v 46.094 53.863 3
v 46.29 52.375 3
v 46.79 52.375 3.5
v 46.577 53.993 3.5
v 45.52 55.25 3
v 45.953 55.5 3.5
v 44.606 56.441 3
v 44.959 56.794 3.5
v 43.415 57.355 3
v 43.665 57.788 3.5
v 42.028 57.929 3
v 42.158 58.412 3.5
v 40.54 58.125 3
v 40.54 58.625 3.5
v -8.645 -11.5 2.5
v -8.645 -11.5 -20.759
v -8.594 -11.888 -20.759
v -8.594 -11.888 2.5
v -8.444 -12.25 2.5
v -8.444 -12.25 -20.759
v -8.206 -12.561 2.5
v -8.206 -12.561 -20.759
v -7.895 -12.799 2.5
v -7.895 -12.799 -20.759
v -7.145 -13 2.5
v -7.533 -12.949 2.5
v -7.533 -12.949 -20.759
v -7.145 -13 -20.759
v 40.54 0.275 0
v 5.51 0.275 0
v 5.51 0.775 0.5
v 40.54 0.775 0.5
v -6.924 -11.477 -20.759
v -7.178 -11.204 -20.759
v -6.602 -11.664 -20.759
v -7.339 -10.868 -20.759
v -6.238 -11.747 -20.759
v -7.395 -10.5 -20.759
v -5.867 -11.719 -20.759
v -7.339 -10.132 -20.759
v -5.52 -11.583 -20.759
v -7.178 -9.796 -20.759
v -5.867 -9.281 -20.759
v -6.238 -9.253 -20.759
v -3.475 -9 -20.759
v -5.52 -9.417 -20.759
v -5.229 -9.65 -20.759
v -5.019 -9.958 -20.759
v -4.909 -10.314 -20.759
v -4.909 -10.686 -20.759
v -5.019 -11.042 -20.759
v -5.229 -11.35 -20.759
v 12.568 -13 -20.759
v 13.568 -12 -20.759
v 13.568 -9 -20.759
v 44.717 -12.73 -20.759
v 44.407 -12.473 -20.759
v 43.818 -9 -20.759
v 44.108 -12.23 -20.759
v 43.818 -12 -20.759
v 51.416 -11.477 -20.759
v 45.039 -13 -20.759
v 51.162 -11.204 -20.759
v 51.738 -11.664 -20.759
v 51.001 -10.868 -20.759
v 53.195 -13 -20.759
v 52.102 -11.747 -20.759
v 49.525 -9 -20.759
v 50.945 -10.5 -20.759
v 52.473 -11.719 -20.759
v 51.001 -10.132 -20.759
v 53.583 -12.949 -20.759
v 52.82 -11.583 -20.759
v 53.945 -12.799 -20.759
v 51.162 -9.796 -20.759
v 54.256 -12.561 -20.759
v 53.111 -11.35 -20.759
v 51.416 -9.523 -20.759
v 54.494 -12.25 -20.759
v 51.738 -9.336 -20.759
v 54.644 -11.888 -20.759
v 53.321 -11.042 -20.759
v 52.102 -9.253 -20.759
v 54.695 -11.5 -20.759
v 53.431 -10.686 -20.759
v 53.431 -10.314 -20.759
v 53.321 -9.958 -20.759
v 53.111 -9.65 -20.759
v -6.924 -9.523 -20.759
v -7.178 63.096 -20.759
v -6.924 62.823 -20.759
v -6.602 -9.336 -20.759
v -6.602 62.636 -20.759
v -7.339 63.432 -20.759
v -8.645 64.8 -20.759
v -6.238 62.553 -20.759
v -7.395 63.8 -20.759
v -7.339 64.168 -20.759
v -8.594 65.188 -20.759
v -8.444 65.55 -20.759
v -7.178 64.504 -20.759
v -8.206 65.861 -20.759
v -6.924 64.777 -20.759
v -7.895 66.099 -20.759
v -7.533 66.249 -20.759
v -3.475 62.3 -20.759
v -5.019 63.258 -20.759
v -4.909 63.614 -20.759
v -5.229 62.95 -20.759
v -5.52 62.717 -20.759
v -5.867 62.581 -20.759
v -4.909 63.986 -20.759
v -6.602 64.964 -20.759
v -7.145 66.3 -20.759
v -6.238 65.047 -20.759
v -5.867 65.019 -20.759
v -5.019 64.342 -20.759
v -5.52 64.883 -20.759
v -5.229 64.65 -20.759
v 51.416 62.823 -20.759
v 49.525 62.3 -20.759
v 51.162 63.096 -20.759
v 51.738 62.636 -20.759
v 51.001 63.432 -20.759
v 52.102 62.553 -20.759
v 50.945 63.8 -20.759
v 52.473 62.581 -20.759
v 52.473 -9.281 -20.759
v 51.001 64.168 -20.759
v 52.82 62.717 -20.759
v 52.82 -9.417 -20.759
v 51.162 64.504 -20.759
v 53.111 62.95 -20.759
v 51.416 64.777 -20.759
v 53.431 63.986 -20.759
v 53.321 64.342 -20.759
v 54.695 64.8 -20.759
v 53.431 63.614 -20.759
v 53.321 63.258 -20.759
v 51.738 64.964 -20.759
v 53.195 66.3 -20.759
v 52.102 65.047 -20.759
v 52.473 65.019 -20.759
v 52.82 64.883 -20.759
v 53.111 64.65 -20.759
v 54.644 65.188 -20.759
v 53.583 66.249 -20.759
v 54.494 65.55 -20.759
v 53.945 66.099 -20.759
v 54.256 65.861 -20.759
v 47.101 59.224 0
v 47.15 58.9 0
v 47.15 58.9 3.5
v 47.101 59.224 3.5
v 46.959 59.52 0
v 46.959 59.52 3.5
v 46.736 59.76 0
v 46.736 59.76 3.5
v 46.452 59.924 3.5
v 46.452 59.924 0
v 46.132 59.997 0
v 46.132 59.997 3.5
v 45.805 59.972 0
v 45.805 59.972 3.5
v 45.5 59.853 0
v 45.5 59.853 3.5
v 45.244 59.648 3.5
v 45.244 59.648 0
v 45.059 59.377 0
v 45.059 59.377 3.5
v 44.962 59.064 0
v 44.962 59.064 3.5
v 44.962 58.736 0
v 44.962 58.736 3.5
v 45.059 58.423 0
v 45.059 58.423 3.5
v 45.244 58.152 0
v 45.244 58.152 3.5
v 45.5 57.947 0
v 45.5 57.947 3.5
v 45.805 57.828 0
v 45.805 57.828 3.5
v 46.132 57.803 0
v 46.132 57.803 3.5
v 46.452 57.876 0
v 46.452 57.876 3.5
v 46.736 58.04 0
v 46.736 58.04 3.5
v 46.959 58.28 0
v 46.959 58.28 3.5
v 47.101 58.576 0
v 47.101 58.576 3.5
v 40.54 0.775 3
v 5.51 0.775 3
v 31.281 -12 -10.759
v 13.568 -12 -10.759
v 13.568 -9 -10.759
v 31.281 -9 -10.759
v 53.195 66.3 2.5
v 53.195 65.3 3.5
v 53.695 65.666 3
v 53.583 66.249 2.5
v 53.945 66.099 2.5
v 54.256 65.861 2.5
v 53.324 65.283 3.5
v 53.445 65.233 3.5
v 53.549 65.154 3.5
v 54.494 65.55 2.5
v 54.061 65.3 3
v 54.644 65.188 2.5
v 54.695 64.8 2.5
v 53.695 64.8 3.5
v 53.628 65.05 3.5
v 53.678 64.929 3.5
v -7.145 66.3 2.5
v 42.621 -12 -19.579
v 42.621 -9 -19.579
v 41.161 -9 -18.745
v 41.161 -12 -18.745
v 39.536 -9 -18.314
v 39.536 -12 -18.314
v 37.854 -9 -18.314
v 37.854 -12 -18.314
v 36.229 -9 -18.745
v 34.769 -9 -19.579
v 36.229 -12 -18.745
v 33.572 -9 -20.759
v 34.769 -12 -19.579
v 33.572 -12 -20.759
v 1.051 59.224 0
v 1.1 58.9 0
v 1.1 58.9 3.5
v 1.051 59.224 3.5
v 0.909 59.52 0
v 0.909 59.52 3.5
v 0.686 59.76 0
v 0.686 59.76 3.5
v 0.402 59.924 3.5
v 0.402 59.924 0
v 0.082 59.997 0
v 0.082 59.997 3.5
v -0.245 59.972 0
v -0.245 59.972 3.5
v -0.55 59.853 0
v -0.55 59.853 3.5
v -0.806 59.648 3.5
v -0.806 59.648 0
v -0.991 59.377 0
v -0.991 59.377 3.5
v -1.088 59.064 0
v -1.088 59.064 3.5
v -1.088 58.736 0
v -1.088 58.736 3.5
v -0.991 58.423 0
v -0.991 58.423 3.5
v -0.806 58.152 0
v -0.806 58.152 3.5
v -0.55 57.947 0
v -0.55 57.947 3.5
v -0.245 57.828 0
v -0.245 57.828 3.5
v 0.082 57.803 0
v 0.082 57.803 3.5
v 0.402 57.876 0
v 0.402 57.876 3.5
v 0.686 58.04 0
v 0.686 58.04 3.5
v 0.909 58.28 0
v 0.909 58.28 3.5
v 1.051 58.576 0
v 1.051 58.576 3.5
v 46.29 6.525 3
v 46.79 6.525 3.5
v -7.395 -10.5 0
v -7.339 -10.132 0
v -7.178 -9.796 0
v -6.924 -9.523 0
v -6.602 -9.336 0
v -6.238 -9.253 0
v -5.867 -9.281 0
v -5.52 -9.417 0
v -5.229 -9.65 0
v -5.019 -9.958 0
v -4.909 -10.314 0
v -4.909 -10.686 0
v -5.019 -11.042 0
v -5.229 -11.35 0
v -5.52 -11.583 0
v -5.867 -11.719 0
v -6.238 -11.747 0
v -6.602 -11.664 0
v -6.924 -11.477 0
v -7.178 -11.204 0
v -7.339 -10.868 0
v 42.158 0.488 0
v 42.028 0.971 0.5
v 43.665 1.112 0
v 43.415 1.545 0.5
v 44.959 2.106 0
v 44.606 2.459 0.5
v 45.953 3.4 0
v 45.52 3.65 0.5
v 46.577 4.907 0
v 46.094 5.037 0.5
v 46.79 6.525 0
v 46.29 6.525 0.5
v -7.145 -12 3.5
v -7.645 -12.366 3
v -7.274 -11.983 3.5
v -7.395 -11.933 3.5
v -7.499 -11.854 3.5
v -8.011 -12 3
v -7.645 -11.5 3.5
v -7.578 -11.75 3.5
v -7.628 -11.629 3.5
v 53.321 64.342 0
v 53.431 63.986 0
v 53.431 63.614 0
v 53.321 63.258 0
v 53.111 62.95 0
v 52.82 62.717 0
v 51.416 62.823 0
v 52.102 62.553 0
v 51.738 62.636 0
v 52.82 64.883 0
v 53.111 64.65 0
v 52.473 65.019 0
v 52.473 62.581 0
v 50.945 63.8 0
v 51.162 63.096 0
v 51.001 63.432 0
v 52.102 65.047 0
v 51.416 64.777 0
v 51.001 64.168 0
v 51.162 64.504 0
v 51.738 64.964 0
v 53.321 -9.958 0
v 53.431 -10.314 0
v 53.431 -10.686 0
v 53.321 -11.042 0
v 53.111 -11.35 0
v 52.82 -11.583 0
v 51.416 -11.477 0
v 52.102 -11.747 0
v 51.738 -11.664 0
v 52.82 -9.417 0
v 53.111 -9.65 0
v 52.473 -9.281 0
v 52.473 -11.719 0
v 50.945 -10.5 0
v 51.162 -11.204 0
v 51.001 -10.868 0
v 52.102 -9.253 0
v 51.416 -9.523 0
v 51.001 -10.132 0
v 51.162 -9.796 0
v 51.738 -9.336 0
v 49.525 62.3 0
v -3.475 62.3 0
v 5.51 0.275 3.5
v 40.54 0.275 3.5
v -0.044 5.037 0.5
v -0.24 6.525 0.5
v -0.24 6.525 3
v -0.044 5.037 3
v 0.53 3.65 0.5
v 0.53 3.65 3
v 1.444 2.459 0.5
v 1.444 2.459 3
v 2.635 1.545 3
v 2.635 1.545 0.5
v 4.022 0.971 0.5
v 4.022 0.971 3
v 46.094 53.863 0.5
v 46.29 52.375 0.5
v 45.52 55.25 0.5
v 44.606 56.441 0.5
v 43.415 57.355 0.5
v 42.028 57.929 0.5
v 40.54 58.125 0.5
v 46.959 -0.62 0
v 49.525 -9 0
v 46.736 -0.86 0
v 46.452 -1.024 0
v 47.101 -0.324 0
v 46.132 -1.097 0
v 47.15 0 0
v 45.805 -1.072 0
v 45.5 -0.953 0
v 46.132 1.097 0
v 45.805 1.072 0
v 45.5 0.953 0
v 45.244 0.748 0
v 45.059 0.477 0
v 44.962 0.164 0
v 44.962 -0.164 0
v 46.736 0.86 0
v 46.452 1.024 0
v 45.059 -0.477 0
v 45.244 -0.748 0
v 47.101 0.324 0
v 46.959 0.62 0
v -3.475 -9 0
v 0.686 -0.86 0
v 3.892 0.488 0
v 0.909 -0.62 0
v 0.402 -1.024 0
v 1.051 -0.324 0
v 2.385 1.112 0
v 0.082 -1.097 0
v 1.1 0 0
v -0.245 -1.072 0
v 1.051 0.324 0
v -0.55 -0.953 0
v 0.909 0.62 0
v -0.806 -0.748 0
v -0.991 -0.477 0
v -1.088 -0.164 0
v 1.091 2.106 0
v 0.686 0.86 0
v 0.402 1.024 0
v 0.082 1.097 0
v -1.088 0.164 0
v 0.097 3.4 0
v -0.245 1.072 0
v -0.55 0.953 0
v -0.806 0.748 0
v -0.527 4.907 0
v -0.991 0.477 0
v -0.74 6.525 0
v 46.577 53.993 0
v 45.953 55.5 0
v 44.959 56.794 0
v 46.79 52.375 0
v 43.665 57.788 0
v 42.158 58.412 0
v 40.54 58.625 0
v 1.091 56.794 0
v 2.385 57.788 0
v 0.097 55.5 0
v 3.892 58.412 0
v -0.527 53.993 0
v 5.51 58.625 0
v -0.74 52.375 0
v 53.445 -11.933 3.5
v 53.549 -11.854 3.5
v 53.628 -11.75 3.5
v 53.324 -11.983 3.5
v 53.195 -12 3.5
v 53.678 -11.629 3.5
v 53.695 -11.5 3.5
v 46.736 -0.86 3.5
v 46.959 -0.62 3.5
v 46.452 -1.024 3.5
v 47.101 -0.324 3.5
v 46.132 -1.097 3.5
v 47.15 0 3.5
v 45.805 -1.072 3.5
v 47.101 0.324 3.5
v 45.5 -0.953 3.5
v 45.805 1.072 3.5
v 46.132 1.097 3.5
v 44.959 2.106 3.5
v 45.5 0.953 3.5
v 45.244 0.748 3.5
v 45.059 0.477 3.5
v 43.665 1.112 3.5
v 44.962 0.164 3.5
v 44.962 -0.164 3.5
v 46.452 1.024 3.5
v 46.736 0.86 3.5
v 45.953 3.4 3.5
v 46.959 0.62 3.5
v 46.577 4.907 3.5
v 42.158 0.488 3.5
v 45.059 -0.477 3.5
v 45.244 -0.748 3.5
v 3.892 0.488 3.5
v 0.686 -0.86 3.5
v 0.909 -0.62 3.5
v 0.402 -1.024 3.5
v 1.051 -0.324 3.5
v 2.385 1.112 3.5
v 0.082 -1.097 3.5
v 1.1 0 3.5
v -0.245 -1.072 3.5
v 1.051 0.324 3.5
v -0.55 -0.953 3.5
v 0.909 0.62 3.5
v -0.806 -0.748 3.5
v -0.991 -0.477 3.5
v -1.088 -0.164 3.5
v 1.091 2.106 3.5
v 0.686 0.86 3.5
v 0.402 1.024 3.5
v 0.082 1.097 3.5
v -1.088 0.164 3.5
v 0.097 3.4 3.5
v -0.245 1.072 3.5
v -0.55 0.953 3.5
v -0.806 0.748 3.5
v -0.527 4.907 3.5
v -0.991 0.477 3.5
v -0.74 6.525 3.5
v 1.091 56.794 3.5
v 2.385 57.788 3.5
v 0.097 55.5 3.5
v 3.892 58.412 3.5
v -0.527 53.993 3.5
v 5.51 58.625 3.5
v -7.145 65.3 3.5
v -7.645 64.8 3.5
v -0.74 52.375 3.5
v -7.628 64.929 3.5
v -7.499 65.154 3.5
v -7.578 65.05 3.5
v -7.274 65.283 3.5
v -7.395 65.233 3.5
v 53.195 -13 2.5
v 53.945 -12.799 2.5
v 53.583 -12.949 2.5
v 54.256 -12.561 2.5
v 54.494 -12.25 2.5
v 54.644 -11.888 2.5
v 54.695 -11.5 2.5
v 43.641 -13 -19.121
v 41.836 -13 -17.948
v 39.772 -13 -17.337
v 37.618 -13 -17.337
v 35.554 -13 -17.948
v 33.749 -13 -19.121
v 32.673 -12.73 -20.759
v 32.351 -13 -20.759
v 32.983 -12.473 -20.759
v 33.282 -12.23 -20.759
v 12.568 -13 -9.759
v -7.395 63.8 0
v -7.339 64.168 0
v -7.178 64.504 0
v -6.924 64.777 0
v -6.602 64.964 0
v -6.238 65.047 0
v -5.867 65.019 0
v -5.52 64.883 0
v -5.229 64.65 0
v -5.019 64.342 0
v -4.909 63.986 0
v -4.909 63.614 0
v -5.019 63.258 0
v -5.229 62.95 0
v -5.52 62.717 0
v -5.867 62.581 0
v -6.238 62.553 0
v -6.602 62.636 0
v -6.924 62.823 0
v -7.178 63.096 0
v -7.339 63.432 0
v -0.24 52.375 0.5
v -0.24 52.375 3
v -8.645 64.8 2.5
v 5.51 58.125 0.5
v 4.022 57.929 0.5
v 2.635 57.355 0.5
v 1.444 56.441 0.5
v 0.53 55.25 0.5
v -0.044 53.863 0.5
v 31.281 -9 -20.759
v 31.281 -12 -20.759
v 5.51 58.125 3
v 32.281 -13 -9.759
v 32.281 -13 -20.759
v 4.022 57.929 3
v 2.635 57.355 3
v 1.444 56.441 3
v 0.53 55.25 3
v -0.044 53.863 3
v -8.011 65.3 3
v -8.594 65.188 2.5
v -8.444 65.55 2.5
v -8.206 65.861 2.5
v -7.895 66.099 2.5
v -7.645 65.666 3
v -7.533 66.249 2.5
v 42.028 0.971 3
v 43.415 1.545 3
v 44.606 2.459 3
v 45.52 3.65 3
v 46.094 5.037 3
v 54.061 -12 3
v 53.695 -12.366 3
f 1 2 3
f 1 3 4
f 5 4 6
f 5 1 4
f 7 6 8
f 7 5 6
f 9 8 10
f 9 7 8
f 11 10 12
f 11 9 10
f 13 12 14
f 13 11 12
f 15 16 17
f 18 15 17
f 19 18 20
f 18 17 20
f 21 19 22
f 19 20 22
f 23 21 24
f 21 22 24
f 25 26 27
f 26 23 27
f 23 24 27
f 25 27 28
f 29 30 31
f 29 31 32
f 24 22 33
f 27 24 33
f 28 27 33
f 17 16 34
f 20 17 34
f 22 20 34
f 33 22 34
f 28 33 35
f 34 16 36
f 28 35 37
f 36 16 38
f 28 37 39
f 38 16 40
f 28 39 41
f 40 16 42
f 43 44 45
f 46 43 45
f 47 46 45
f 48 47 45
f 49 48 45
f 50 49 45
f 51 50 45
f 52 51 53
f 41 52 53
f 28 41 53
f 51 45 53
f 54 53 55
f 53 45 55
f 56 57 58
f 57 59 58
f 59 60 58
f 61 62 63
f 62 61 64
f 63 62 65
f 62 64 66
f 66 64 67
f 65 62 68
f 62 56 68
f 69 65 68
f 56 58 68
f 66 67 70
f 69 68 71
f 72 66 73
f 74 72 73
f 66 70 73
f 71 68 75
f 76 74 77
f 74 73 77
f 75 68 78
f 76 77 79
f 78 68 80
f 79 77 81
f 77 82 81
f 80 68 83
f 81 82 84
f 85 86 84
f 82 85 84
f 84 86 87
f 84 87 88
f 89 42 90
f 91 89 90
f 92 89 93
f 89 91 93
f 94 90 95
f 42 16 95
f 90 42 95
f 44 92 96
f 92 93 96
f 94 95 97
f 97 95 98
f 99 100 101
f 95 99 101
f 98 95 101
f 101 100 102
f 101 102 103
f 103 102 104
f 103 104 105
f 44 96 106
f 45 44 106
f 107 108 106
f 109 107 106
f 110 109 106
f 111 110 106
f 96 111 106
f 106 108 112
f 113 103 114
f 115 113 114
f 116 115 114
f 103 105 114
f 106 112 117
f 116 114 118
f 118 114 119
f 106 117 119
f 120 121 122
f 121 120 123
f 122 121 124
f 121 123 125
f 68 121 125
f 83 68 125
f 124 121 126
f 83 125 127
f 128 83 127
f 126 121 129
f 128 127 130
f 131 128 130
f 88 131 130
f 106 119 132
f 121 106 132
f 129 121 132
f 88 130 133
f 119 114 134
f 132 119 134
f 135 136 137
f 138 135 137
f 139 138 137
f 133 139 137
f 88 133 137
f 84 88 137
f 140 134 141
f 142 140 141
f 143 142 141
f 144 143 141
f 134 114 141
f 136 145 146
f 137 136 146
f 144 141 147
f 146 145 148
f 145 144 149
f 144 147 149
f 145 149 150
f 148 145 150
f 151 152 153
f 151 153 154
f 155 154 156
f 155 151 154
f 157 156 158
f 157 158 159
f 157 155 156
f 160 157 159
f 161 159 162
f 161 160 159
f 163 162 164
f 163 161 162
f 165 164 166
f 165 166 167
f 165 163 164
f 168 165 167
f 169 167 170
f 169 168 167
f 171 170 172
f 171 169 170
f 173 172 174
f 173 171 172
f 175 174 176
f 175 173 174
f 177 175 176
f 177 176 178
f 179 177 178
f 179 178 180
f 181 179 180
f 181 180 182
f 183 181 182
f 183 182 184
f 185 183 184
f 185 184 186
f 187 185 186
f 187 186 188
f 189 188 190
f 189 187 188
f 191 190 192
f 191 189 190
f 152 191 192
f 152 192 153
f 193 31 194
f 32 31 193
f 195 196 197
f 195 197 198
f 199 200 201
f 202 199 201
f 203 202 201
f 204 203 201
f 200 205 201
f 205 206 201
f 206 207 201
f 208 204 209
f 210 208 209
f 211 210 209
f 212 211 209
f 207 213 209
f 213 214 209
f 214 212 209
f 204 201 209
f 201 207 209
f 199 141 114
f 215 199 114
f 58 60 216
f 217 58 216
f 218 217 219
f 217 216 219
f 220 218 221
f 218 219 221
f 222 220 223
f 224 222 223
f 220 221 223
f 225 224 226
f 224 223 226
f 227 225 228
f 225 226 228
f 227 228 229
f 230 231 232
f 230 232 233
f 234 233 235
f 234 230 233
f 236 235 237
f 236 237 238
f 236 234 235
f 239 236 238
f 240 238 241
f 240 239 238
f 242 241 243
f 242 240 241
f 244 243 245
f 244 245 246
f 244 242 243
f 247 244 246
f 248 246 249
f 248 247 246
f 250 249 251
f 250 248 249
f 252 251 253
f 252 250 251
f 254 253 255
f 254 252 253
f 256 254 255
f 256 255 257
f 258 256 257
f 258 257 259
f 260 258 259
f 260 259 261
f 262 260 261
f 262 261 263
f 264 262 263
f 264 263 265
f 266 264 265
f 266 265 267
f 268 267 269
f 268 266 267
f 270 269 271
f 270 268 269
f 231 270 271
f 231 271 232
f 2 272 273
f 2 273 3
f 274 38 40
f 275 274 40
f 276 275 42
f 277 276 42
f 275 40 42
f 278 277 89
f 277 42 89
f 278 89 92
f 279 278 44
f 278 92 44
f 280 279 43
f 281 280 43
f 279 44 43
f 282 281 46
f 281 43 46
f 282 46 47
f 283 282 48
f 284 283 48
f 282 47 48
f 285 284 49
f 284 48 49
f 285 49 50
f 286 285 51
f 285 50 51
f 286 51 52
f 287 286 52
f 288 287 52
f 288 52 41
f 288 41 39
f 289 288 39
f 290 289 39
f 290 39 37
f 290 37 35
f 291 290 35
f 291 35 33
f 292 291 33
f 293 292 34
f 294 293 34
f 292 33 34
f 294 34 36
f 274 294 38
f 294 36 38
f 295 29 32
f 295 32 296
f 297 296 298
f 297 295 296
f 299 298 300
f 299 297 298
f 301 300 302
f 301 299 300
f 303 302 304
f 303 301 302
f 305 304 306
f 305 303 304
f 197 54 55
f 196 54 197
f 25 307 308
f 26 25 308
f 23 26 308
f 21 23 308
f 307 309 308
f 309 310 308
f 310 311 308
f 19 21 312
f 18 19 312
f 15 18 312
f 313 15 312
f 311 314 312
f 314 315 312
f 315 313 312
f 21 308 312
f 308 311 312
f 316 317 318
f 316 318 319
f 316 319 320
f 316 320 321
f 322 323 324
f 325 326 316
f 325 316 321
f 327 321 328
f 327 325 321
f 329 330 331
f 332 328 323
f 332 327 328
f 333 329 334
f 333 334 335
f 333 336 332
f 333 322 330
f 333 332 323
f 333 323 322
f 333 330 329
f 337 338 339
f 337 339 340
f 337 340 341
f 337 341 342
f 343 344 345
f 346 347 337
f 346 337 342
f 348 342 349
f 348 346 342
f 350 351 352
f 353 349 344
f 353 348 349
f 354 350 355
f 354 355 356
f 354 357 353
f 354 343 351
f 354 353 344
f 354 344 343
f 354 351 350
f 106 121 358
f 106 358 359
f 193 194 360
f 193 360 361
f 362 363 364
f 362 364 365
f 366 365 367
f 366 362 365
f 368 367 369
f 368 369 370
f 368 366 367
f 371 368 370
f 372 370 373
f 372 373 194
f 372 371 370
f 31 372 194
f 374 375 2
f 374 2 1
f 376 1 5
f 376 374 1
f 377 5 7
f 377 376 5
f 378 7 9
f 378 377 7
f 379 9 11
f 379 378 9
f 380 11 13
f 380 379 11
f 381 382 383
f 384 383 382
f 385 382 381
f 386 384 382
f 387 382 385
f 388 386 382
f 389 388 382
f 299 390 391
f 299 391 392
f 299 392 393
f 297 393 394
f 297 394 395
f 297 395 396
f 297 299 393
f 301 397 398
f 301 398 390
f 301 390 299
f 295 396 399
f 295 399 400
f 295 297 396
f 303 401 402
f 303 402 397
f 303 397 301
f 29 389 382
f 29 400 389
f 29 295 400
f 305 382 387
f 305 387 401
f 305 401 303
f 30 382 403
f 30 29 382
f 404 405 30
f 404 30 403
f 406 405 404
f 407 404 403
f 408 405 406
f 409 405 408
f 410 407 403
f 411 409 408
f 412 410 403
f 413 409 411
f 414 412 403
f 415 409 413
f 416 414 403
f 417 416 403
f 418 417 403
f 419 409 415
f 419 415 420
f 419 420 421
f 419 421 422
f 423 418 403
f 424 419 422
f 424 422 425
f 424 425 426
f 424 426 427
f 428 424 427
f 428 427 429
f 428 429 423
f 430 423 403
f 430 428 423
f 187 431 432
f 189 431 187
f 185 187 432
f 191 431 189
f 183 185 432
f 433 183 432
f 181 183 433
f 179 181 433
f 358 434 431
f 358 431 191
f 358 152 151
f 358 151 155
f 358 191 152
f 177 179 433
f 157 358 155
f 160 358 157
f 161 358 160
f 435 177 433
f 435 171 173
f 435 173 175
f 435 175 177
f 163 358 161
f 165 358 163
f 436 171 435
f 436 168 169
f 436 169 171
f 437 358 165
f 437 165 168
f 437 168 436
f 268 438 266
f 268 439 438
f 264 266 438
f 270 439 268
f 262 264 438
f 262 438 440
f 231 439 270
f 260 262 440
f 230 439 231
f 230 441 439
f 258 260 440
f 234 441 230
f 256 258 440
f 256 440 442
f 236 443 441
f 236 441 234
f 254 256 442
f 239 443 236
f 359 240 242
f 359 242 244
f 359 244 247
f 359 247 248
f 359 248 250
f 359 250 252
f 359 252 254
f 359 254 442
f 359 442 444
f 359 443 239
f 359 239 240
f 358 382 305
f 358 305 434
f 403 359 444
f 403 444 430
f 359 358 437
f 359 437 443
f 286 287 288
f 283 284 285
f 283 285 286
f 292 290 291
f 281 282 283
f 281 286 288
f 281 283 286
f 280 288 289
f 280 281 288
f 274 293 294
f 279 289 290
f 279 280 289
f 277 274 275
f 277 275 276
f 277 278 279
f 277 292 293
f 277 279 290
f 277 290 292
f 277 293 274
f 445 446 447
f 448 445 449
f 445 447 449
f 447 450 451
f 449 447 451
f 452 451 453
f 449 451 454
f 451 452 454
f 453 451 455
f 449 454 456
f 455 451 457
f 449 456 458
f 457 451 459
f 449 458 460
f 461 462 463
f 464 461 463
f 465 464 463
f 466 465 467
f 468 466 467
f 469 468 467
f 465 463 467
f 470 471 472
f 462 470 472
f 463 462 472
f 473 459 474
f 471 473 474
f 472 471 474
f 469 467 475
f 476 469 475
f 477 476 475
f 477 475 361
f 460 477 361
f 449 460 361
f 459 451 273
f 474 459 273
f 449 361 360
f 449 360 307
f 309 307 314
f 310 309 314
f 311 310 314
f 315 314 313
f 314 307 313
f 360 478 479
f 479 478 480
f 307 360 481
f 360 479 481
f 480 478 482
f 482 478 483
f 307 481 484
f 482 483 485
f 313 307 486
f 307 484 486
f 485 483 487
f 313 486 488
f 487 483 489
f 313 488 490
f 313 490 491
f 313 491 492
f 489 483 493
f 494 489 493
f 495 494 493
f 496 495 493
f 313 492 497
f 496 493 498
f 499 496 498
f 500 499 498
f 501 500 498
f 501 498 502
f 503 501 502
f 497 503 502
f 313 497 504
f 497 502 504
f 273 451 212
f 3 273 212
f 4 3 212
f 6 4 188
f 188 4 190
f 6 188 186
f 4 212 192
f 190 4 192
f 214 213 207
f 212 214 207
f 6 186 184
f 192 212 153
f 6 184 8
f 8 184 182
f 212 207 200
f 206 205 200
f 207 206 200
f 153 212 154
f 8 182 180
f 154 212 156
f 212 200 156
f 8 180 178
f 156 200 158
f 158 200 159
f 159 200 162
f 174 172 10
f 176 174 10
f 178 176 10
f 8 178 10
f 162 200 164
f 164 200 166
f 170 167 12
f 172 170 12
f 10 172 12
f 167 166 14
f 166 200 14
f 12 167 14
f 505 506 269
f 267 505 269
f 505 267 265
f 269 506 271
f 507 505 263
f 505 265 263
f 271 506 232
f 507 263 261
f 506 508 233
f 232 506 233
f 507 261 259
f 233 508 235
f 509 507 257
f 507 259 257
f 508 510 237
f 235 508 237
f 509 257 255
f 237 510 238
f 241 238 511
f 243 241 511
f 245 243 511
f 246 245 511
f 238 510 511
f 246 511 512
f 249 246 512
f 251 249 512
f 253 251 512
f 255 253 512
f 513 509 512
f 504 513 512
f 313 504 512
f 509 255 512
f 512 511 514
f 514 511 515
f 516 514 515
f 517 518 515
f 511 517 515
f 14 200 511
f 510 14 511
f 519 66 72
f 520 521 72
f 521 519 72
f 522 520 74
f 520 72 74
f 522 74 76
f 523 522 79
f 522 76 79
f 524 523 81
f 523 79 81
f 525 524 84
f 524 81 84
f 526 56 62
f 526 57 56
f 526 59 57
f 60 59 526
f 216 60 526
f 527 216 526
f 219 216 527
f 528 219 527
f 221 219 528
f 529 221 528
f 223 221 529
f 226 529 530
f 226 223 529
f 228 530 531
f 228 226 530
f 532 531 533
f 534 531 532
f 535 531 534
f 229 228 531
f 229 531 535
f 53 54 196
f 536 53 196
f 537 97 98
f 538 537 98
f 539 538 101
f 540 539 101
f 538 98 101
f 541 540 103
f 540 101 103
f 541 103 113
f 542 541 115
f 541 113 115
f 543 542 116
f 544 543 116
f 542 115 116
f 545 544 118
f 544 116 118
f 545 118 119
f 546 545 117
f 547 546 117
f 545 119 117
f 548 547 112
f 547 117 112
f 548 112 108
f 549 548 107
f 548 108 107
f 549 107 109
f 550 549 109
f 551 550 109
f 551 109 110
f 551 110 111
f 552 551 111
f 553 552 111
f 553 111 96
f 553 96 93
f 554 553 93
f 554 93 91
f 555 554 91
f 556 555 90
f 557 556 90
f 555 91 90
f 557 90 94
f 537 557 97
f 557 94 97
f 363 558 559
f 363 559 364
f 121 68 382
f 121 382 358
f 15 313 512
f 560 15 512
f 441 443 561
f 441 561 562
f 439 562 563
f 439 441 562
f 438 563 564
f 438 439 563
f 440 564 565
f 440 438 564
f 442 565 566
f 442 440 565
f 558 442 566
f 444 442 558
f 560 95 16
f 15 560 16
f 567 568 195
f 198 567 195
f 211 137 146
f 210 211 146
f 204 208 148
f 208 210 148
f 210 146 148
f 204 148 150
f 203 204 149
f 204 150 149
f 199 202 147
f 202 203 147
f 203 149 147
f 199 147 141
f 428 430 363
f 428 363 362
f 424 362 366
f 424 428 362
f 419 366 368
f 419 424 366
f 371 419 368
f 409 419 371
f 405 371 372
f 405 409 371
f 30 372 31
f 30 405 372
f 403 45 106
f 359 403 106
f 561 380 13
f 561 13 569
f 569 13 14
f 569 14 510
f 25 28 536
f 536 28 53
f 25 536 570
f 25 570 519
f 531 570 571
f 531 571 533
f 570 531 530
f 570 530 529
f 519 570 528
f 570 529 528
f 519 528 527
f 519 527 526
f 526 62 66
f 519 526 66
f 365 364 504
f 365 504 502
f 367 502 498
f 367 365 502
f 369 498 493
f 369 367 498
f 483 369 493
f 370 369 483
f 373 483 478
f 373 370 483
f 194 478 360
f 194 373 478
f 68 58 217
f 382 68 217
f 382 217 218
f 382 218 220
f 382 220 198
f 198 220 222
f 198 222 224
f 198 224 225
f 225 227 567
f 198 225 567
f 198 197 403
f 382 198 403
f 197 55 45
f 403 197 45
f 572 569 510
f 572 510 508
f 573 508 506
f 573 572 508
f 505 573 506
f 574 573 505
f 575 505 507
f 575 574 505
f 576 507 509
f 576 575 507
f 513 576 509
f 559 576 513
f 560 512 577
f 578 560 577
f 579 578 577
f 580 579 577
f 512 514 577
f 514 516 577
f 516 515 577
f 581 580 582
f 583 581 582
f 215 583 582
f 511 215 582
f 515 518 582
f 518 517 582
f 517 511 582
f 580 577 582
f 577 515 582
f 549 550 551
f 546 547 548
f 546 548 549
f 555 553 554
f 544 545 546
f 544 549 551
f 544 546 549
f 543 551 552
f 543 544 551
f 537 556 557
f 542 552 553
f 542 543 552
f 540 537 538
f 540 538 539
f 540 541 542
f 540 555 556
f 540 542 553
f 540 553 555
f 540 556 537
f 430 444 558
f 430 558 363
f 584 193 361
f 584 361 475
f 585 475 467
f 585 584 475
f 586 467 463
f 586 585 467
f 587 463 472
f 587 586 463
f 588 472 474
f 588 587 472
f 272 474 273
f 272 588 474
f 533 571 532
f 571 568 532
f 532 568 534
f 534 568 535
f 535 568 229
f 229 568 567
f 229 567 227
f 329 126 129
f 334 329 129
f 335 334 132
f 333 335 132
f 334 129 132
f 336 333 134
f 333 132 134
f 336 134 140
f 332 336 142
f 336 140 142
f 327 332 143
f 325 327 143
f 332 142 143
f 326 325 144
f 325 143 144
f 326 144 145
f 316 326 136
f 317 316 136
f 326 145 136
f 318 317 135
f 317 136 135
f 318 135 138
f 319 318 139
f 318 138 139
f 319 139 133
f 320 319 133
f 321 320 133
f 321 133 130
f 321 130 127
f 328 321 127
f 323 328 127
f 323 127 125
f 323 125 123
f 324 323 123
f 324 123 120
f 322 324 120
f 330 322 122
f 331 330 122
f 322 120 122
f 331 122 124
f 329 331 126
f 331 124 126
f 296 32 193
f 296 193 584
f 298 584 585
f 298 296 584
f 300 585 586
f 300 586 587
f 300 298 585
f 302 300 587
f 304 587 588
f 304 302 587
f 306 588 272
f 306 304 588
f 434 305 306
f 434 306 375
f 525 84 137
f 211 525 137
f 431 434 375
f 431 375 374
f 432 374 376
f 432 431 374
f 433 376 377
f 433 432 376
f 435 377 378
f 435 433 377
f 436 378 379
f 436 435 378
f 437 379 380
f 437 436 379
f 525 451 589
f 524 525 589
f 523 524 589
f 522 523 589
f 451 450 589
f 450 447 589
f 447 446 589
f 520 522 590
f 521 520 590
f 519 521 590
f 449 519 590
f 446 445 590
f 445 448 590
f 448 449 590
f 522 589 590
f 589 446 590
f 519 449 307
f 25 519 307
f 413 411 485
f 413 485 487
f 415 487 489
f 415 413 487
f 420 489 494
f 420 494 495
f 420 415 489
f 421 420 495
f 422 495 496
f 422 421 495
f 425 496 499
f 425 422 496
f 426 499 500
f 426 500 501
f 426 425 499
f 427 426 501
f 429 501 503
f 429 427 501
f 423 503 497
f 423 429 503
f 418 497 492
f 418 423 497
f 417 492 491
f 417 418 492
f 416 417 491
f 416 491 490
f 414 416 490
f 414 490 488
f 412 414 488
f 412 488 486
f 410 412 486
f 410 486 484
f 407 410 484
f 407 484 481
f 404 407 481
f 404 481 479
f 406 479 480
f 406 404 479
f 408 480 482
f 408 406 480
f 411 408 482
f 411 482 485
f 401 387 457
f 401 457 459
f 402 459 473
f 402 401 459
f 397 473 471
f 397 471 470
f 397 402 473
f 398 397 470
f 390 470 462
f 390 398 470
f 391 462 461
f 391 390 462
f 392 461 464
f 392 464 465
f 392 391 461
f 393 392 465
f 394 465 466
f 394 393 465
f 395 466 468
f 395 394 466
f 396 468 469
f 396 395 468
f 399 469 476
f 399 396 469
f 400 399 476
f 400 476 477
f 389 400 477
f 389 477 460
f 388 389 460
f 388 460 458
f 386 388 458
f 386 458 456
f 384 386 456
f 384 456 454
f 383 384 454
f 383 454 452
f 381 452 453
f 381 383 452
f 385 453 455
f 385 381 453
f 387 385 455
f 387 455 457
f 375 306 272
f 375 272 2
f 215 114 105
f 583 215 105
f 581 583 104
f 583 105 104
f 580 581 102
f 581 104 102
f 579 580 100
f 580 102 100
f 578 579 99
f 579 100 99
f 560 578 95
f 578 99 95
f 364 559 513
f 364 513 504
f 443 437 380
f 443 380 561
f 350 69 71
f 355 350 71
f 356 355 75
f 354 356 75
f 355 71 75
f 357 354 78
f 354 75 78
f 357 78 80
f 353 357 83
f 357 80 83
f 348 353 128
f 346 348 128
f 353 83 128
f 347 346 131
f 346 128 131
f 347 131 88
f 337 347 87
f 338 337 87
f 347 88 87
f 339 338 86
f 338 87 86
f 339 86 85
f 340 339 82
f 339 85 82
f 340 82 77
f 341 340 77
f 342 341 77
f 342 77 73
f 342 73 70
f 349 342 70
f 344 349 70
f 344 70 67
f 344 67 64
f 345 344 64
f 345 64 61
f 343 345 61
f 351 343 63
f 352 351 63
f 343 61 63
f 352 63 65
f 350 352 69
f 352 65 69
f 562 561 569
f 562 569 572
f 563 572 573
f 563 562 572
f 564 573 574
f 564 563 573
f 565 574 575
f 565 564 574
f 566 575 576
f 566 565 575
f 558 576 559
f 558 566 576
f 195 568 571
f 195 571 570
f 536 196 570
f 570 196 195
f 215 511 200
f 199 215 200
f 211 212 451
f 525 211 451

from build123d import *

# Parameters (mm, degrees)
SKETCH1_R           = 1.1
BOSS_EXTRUDE1_DEPTH = 3.5
BOSS_EXTRUDE2_START = 20.759
SKETCH2_R           = 1.25
SKETCH2_W           = 53
SKETCH2_H           = 71.3
BOSS_EXTRUDE2_DEPTH = 20.759
SKETCH3_R           = 6.499999954
SKETCH3_W           = 17.713
SKETCH3_H           = 10
CUT_EXTRUDE1_DEPTH  = 10
CHAMFER1_SIZE       = 1
CHAMFER2_SIZE       = 0.5
CHAMFER3_SIZE       = 1


with BuildPart() as part:
    # Sketch1 → Boss-Extrude1 (new body)
    with BuildSketch(Plane.XY):
        with BuildLine():
            Line((-8.645, -11.5), (-8.645, 64.8))
            ThreePointArc((-8.645, 64.8), (-8.205660172, 65.860660172), (-7.145, 66.3))
            Line((-7.145, 66.3), (53.195, 66.3))
            ThreePointArc((53.195, 66.3), (54.255660172, 65.860660172), (54.695, 64.8))
            Line((54.695, 64.8), (54.695, -11.5))
            ThreePointArc((54.695, -11.5), (54.255660172, -12.560660172), (53.195, -13))
            Line((53.195, -13), (-7.145, -13))
            ThreePointArc((-7.145, -13), (-8.205660172, -12.560660172), (-8.645, -11.5))
        make_face()
        Circle(SKETCH1_R, mode=Mode.SUBTRACT)
        with Locations((0, 58.9)):
            Circle(SKETCH1_R, mode=Mode.SUBTRACT)
        with Locations((46.05, 58.9)):
            Circle(SKETCH1_R, mode=Mode.SUBTRACT)
        with Locations((46.05, 0)):
            Circle(SKETCH1_R, mode=Mode.SUBTRACT)
        with BuildLine():
            Line((5.51, 0.775), (40.54, 0.775))
            ThreePointArc((40.54, 0.775), (44.605863992, 2.459136008), (46.29, 6.525))
            Line((46.29, 6.525), (46.29, 52.375))
            ThreePointArc((46.29, 52.375), (44.605863992, 56.440863992), (40.54, 58.125))
            Line((40.54, 58.125), (5.51, 58.125))
            ThreePointArc((5.51, 58.125), (1.444136008, 56.440863992), (-0.24, 52.375))
            Line((-0.24, 52.375), (-0.24, 6.525))
            ThreePointArc((-0.24, 6.525), (1.444136008, 2.459136008), (5.51, 0.775))
        make_face(mode=Mode.SUBTRACT)
    extrude(amount=BOSS_EXTRUDE1_DEPTH)

    # Sketch2 → Boss-Extrude2 (add)
    with BuildSketch(Plane(origin=(0, 0, 0), x_dir=(-1, 0, 0), z_dir=(0, 0, -1)).offset(BOSS_EXTRUDE2_START)):
        with BuildLine():
            Line((-54.695, -11.5), (-54.695, 64.8))
            ThreePointArc((-54.695, 64.8), (-54.255660172, 65.860660172), (-53.195, 66.3))
            Line((-53.195, 66.3), (7.145, 66.3))
            ThreePointArc((7.145, 66.3), (8.205660172, 65.860660172), (8.645, 64.8))
            Line((8.645, 64.8), (8.645, -11.5))
            ThreePointArc((8.645, -11.5), (8.205660172, -12.560660172), (7.145, -13))
            Line((7.145, -13), (-53.195, -13))
            ThreePointArc((-53.195, -13), (-54.255660172, -12.560660172), (-54.695, -11.5))
        make_face()
        with Locations((-52.195, -10.5)):
            Circle(SKETCH2_R, mode=Mode.SUBTRACT)
        with Locations((6.145, -10.5)):
            Circle(SKETCH2_R, mode=Mode.SUBTRACT)
        with Locations((6.145, 63.8)):
            Circle(SKETCH2_R, mode=Mode.SUBTRACT)
        with Locations((-52.195, 63.8)):
            Circle(SKETCH2_R, mode=Mode.SUBTRACT)
        with Locations((-23.025, 26.65)):
            Rectangle(SKETCH2_W, SKETCH2_H, mode=Mode.SUBTRACT)
    extrude(amount=-BOSS_EXTRUDE2_DEPTH)

    # Sketch3 → Cut-Extrude1 (cut)
    with BuildSketch(Plane.XZ.offset(13)):
        with Locations((38.695, -24.759)):
            Circle(SKETCH3_R)
        with Locations((22.424100803, -15.759)):
            Rectangle(SKETCH3_W, SKETCH3_H)
    extrude(amount=-CUT_EXTRUDE1_DEPTH, mode=Mode.SUBTRACT)

    # Chamfer1
    chamfer1_edges = [part.edges().sort_by_distance(p)[0] for p in [
        (54.255660172, -12.560660172, 3.5),
        (54.695, 26.65, 3.5),
        (54.255660172, 65.860660172, 3.5),
        (23.025, 66.3, 3.5),
        (-8.205660172, 65.860660172, 3.5),
        (-8.645, 26.65, 3.5),
        (-8.205660172, -12.560660172, 3.5),
        (23.025, -13, 3.5),
    ]]
    chamfer(chamfer1_edges, length=CHAMFER1_SIZE)

    # Chamfer2
    chamfer2_edges = [part.edges().sort_by_distance(p)[0] for p in [
        (44.605863992, 2.459136008, 0),
        (46.29, 29.45, 0),
        (44.605863992, 56.440863992, 0),
        (23.025, 58.125, 0),
        (1.444136008, 56.440863992, 0),
        (-0.24, 29.45, 0),
        (1.444136008, 2.459136008, 0),
        (23.025, 0.775, 0),
        (44.605863992, 2.459136008, 3.5),
        (46.29, 29.45, 3.5),
        (44.605863992, 56.440863992, 3.5),
        (23.025, 58.125, 3.5),
        (1.444136008, 56.440863992, 3.5),
        (-0.24, 29.45, 3.5),
        (1.444136008, 2.459136008, 3.5),
        (23.025, 0.775, 3.5),
    ]]
    chamfer(chamfer2_edges, length=CHAMFER2_SIZE)

    # Chamfer3
    chamfer3_edges = [part.edges().sort_by_distance(p)[0] for p in [
        (38.695, -13, -18.259000046),
        (13.567600803, -13, -15.759),
        (31.280600803, -13, -15.759),
        (22.424100803, -13, -10.759),
    ]]
    chamfer(chamfer3_edges, length=CHAMFER3_SIZE)


solid = part.part
